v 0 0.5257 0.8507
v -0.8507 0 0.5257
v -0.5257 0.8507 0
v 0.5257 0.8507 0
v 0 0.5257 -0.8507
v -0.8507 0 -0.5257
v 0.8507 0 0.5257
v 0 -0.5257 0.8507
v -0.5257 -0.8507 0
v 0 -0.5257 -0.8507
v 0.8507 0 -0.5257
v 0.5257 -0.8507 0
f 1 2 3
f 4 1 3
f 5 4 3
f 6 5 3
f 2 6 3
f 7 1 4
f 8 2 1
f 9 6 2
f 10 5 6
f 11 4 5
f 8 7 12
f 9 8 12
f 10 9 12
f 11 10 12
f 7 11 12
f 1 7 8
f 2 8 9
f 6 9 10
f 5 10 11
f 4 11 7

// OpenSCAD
// icosphere code copied with pride from Andreas Kahler
// http://blog.andreaskahler.com/2009/06/creating-icosphere-mesh-in-code.html

// A great repository for all kinds of polyhedra
// http://dmccooey.com/polyhedra/GeodesicIcosahedra.html

$fn=10;


/* [show] */

showStatistics=true;
icosphere();
*test();


// set recursion to the desired level. 0=20 tris, 1=80 tris, 2=320 tris
module icosphere(radius=1,recursion=0,icoPnts,icoTris){
  //t = (1 + sqrt(5))/2;
  //comment from monfera to get verts to unit sphere
  t= sqrt((5+sqrt(5))/10);
  s= sqrt((5-sqrt(5))/10);
  
  init=(icoPnts||icoTris) ? false : true; //initial call if icoPnts is empty
  
  // 1 --> draw icosphere from base mesh
  // 2 --> loop through base mesh and subdivide by 4 --> 20 steps
  // 3 --> loop through subdivided mesh and subdivide again (or subdivide by 16) --> 80 steps
  // 4 ...
  
  verts = [[-s, t, 0],  //0
           [ s, t, 0],
           [-s,-t, 0],
           [ s,-t, 0],
           [ 0,-s, t],
           [ 0, s, t],
           [ 0,-s,-t],
           [ 0, s,-t],
           [ t, 0,-s],
           [ t, 0, s],
           [-t, 0,-s],
           [-t, 0, s]]; //11
  
  //base mesh with 20 faces
  tris=  [
  //5 faces around point 0
    [ 0,11, 5], //0
    [ 0, 5, 1],
    [ 0, 1, 7],
    [ 0, 7,10],
    [ 0,10,11], 
  // 5 adjacent faces
    [ 1, 5, 9], //5
    [ 5,11, 4],
    [11,10, 2],
    [10, 7, 6],
    [ 7, 1, 8], 
  //5 faces around point 3
    [ 3, 9, 4], //10
    [ 3, 4, 2],
    [ 3, 2, 6],
    [ 3, 6, 8],
    [ 3, 8, 9], 
  //5 adjacent faces 
    [ 4, 9, 5], //15
    [ 2, 4,11],
    [ 6, 2,10],
    [ 8, 6, 7],
    [ 9, 8, 1]  //19
    ];
    
  if (recursion){
    verts= (init) ? verts : icoPnts;
    tris= (init) ? tris : icoTris;
    
    newSegments=recurseTris(verts,tris);
    newVerts=newSegments[0];
    newTris= newSegments[1];
    icosphere(radius,recursion-1,newVerts,newTris);
    
  }
  else if (init){//draw the base icosphere if no recursion and initial call
    scale(radius) polyhedron(verts,tris); 
    if (showStatistics)
      for (tri=tris){ //calculate the length of each tris edges
        l1=norm(verts[tri[0]]-verts[tri[1]]);
        l2=norm(verts[tri[1]]-verts[tri[2]]);
        l3=norm(verts[tri[2]]-verts[tri[0]]);
        lmin=min(l1,l2,l3); 
        lmax=max(l1,l2,l3);
        ldev=lmax-lmin; //deviation between edges
        echo(l1,l2,l3,ldev);
      }
    }
  else{ // if not initial call some recursion has to be happened
    scale(radius) polyhedron(icoPnts,icoTris); 
    if (showStatistics)
      for (tri=icoTris){ //calculate the length of each tris edges
        l1=norm(icoPnts[tri[0]]-icoPnts[tri[1]]);
        l2=norm(icoPnts[tri[1]]-icoPnts[tri[2]]);
        l3=norm(icoPnts[tri[2]]-icoPnts[tri[0]]);
        lmin=min(l1,l2,l3); 
        lmax=max(l1,l2,l3);
        ldev=lmax-lmin; //deviation between edges
        echo(l1,l2,l3,ldev);
      }
    
  }
}




/*adds verts if not already there, 
 takes array of vertices and indices of a tri to expand
 returns expanded array of verts and indices of new polygon with 4 faces
 [[verts],[0,(a),(c)],[1,(b),(a)],[2,(c),(b)],[(a),(b),(c)]] */
function addTris(verts,tri)= let(
    a= getMiddlePoint(verts[tri[0]],verts[tri[1]]), //will produce doubles
    b= getMiddlePoint(verts[tri[1]],verts[tri[2]]), //these are unique
    c= getMiddlePoint(verts[tri[2]],verts[tri[0]]), //these are unique
    
    aIdx = search(verts, a), //point a already exists
    l=len(verts)                       
  ) len(aIdx) ? [concat(verts,[a,b,c]),[[tri[0],l,l+2],   //1
                                        [tri[1],l+1,l],   //2
                                        [tri[2],l+2,l+1], //3
                                        [l,l+1,l+2]] ] :  //4

                [concat(verts,[b,c]), [[tri[0],aIdx,l+1], //1
                                      [tri[1],l,aIdx],    //2
                                      [tri[2],l+1,l],     //3
                                      [aIdx,l,l+1]] ];    //4


// recursive function that does one recursion on the whole icosphere (auto recursion steps derived from len(tris))
function recurseTris(verts,tris,newTris=[],steps=0,step=0)= let(
    stepsCnt = steps ? steps : len(tris)-1, //if initial call initialize steps
    newSegment=addTris(verts=verts,tri=tris[step]),
    newVerts=newSegment[0], //all old and new Vertices
    newerTris=concat(newTris,newSegment[1]) //only new Tris
  ) (stepsCnt==(step)) ? [newVerts,newerTris] :
                           recurseTris(newVerts,tris,newerTris,stepsCnt,step+1);
                
                
                
//get point between two verts on unity sphere
/* Point3D middle = new Point3D(
            (point1.X + point2.X) / 2.0, 
            (point1.Y + point2.Y) / 2.0, 
            (point1.Z + point2.Z) / 2.0);  --> (p1+p2)/2
            */
            
function getMiddlePoint(p1,p2)=fixPosition((p1+p2)/2);
//function getMiddlePoint(p1,p2)=(p1+p2)/2;



//fix position to be on unit sphere
/*
private int addVertex(Point3D p)
    {
        double length = Math.Sqrt(p.X * p.X + p.Y * p.Y + p.Z * p.Z);                --> norm(p)
        geometry.Positions.Add(new Point3D(p.X/length, p.Y/length, p.Z/length)); 
        return index++;
    }
    */
function fixPosition(p)=let(l=norm(p)) [p.x/l,p.y/l,p.z/l];
verts=[[-0.525731, 0.850651, 0], [0.525731, 0.850651, 0], [0, 0.525731, 0.850651]];
/* test if norm equals quadric mean and vector/2 = x/2,Y/2,Z/2
p=(verts[0]+verts[1])/2;
q=[(verts[0].x+verts[1].x)/2,
   (verts[0].y+verts[1].y)/2,
   (verts[0].z+verts[1].z)/2];

l=(verts[0]+verts[1])/2;
m=norm(p);
echo(q,l);
echo(l,m);
*/
module test(separate=false, inWhole=true){
  t= sqrt((5+sqrt(5))/10);
  s= sqrt((5-sqrt(5))/10);
  
  //1st and 2nd tri
  p0=[-s, t, 0];
  p1=[ s, t, 0];
  p11=[-t, 0, s];
  p5=[ 0, s, t];
  
  sideLngth=norm(p0-p11);
  r=sideLngth/(sqrt(3));
  rot=90;
  
        //0  1  2  3
  tVerts=[p0,p1,p5,p11];
  tTris=[[0,3,2],[0,2,1]];
    
  //         a       b       c
  //tVerts=tPoly;
  a=getMiddlePoint(tVerts[0],tVerts[1]);
  b=getMiddlePoint(tVerts[1],tVerts[2]);
  c=getMiddlePoint(tVerts[2],tVerts[0]);
  
  //create two separate new segments
  newSegment1=addTris(tVerts,tTris[0]);
  newSegment2=addTris(tVerts,tTris[1]);
  
  newVerts1=newSegment1[0]; //put just the new vertices in a new array
  newFaces1=newSegment1[1]; //indicies for the 1st new segment
  
  
  translate(a) sphere(0.05);
  echo(str("a,b,c: ",a,b,c));
  
           
  //base tris 
  color("green",0.5) polyhedron(tVerts,tTris); //"old" tris
  //separate segments of new tris
  if(separate){
    color("red",0.5) polyhedron(newSegment1[0],newSegment1[1]);
    color("orange",0.5) polyhedron(newSegment2[0],newSegment2[1]);
  }
  else if (inWhole){//create one new Segment (out of two tris) in whole
    newerSegments=recurseTris(tVerts,tTris);
    newVerts=newerSegments[0];
    newFaces=newerSegments[1];
    color("blue",0.5) polyhedron(newVerts,newFaces);
    echo(str("\ninput Verts    (",len(tVerts),"): ", tVerts,"\n",
             "output Verts (",len(newVerts),"): ", newVerts,"\n",
             "input Faces (",len(tTris),"): ", tTris,"\n",
             "output Faces (",len(newFaces),"): ", newFaces));
  }
  
  else{ //create one new Segment using the first one
    newSegments=addTris(newVerts1,tTris[1]); //new Segments using the new array
    newVerts=newSegments[0]; //all old and new vertices for two new segments
    newFaces2=newSegments[1]; //indicies for the 2nd new segment
    newFaces=concat(newFaces1,newFaces2);
    color("blue",0.5) polyhedron(newVerts,newFaces);
  }
}

  
